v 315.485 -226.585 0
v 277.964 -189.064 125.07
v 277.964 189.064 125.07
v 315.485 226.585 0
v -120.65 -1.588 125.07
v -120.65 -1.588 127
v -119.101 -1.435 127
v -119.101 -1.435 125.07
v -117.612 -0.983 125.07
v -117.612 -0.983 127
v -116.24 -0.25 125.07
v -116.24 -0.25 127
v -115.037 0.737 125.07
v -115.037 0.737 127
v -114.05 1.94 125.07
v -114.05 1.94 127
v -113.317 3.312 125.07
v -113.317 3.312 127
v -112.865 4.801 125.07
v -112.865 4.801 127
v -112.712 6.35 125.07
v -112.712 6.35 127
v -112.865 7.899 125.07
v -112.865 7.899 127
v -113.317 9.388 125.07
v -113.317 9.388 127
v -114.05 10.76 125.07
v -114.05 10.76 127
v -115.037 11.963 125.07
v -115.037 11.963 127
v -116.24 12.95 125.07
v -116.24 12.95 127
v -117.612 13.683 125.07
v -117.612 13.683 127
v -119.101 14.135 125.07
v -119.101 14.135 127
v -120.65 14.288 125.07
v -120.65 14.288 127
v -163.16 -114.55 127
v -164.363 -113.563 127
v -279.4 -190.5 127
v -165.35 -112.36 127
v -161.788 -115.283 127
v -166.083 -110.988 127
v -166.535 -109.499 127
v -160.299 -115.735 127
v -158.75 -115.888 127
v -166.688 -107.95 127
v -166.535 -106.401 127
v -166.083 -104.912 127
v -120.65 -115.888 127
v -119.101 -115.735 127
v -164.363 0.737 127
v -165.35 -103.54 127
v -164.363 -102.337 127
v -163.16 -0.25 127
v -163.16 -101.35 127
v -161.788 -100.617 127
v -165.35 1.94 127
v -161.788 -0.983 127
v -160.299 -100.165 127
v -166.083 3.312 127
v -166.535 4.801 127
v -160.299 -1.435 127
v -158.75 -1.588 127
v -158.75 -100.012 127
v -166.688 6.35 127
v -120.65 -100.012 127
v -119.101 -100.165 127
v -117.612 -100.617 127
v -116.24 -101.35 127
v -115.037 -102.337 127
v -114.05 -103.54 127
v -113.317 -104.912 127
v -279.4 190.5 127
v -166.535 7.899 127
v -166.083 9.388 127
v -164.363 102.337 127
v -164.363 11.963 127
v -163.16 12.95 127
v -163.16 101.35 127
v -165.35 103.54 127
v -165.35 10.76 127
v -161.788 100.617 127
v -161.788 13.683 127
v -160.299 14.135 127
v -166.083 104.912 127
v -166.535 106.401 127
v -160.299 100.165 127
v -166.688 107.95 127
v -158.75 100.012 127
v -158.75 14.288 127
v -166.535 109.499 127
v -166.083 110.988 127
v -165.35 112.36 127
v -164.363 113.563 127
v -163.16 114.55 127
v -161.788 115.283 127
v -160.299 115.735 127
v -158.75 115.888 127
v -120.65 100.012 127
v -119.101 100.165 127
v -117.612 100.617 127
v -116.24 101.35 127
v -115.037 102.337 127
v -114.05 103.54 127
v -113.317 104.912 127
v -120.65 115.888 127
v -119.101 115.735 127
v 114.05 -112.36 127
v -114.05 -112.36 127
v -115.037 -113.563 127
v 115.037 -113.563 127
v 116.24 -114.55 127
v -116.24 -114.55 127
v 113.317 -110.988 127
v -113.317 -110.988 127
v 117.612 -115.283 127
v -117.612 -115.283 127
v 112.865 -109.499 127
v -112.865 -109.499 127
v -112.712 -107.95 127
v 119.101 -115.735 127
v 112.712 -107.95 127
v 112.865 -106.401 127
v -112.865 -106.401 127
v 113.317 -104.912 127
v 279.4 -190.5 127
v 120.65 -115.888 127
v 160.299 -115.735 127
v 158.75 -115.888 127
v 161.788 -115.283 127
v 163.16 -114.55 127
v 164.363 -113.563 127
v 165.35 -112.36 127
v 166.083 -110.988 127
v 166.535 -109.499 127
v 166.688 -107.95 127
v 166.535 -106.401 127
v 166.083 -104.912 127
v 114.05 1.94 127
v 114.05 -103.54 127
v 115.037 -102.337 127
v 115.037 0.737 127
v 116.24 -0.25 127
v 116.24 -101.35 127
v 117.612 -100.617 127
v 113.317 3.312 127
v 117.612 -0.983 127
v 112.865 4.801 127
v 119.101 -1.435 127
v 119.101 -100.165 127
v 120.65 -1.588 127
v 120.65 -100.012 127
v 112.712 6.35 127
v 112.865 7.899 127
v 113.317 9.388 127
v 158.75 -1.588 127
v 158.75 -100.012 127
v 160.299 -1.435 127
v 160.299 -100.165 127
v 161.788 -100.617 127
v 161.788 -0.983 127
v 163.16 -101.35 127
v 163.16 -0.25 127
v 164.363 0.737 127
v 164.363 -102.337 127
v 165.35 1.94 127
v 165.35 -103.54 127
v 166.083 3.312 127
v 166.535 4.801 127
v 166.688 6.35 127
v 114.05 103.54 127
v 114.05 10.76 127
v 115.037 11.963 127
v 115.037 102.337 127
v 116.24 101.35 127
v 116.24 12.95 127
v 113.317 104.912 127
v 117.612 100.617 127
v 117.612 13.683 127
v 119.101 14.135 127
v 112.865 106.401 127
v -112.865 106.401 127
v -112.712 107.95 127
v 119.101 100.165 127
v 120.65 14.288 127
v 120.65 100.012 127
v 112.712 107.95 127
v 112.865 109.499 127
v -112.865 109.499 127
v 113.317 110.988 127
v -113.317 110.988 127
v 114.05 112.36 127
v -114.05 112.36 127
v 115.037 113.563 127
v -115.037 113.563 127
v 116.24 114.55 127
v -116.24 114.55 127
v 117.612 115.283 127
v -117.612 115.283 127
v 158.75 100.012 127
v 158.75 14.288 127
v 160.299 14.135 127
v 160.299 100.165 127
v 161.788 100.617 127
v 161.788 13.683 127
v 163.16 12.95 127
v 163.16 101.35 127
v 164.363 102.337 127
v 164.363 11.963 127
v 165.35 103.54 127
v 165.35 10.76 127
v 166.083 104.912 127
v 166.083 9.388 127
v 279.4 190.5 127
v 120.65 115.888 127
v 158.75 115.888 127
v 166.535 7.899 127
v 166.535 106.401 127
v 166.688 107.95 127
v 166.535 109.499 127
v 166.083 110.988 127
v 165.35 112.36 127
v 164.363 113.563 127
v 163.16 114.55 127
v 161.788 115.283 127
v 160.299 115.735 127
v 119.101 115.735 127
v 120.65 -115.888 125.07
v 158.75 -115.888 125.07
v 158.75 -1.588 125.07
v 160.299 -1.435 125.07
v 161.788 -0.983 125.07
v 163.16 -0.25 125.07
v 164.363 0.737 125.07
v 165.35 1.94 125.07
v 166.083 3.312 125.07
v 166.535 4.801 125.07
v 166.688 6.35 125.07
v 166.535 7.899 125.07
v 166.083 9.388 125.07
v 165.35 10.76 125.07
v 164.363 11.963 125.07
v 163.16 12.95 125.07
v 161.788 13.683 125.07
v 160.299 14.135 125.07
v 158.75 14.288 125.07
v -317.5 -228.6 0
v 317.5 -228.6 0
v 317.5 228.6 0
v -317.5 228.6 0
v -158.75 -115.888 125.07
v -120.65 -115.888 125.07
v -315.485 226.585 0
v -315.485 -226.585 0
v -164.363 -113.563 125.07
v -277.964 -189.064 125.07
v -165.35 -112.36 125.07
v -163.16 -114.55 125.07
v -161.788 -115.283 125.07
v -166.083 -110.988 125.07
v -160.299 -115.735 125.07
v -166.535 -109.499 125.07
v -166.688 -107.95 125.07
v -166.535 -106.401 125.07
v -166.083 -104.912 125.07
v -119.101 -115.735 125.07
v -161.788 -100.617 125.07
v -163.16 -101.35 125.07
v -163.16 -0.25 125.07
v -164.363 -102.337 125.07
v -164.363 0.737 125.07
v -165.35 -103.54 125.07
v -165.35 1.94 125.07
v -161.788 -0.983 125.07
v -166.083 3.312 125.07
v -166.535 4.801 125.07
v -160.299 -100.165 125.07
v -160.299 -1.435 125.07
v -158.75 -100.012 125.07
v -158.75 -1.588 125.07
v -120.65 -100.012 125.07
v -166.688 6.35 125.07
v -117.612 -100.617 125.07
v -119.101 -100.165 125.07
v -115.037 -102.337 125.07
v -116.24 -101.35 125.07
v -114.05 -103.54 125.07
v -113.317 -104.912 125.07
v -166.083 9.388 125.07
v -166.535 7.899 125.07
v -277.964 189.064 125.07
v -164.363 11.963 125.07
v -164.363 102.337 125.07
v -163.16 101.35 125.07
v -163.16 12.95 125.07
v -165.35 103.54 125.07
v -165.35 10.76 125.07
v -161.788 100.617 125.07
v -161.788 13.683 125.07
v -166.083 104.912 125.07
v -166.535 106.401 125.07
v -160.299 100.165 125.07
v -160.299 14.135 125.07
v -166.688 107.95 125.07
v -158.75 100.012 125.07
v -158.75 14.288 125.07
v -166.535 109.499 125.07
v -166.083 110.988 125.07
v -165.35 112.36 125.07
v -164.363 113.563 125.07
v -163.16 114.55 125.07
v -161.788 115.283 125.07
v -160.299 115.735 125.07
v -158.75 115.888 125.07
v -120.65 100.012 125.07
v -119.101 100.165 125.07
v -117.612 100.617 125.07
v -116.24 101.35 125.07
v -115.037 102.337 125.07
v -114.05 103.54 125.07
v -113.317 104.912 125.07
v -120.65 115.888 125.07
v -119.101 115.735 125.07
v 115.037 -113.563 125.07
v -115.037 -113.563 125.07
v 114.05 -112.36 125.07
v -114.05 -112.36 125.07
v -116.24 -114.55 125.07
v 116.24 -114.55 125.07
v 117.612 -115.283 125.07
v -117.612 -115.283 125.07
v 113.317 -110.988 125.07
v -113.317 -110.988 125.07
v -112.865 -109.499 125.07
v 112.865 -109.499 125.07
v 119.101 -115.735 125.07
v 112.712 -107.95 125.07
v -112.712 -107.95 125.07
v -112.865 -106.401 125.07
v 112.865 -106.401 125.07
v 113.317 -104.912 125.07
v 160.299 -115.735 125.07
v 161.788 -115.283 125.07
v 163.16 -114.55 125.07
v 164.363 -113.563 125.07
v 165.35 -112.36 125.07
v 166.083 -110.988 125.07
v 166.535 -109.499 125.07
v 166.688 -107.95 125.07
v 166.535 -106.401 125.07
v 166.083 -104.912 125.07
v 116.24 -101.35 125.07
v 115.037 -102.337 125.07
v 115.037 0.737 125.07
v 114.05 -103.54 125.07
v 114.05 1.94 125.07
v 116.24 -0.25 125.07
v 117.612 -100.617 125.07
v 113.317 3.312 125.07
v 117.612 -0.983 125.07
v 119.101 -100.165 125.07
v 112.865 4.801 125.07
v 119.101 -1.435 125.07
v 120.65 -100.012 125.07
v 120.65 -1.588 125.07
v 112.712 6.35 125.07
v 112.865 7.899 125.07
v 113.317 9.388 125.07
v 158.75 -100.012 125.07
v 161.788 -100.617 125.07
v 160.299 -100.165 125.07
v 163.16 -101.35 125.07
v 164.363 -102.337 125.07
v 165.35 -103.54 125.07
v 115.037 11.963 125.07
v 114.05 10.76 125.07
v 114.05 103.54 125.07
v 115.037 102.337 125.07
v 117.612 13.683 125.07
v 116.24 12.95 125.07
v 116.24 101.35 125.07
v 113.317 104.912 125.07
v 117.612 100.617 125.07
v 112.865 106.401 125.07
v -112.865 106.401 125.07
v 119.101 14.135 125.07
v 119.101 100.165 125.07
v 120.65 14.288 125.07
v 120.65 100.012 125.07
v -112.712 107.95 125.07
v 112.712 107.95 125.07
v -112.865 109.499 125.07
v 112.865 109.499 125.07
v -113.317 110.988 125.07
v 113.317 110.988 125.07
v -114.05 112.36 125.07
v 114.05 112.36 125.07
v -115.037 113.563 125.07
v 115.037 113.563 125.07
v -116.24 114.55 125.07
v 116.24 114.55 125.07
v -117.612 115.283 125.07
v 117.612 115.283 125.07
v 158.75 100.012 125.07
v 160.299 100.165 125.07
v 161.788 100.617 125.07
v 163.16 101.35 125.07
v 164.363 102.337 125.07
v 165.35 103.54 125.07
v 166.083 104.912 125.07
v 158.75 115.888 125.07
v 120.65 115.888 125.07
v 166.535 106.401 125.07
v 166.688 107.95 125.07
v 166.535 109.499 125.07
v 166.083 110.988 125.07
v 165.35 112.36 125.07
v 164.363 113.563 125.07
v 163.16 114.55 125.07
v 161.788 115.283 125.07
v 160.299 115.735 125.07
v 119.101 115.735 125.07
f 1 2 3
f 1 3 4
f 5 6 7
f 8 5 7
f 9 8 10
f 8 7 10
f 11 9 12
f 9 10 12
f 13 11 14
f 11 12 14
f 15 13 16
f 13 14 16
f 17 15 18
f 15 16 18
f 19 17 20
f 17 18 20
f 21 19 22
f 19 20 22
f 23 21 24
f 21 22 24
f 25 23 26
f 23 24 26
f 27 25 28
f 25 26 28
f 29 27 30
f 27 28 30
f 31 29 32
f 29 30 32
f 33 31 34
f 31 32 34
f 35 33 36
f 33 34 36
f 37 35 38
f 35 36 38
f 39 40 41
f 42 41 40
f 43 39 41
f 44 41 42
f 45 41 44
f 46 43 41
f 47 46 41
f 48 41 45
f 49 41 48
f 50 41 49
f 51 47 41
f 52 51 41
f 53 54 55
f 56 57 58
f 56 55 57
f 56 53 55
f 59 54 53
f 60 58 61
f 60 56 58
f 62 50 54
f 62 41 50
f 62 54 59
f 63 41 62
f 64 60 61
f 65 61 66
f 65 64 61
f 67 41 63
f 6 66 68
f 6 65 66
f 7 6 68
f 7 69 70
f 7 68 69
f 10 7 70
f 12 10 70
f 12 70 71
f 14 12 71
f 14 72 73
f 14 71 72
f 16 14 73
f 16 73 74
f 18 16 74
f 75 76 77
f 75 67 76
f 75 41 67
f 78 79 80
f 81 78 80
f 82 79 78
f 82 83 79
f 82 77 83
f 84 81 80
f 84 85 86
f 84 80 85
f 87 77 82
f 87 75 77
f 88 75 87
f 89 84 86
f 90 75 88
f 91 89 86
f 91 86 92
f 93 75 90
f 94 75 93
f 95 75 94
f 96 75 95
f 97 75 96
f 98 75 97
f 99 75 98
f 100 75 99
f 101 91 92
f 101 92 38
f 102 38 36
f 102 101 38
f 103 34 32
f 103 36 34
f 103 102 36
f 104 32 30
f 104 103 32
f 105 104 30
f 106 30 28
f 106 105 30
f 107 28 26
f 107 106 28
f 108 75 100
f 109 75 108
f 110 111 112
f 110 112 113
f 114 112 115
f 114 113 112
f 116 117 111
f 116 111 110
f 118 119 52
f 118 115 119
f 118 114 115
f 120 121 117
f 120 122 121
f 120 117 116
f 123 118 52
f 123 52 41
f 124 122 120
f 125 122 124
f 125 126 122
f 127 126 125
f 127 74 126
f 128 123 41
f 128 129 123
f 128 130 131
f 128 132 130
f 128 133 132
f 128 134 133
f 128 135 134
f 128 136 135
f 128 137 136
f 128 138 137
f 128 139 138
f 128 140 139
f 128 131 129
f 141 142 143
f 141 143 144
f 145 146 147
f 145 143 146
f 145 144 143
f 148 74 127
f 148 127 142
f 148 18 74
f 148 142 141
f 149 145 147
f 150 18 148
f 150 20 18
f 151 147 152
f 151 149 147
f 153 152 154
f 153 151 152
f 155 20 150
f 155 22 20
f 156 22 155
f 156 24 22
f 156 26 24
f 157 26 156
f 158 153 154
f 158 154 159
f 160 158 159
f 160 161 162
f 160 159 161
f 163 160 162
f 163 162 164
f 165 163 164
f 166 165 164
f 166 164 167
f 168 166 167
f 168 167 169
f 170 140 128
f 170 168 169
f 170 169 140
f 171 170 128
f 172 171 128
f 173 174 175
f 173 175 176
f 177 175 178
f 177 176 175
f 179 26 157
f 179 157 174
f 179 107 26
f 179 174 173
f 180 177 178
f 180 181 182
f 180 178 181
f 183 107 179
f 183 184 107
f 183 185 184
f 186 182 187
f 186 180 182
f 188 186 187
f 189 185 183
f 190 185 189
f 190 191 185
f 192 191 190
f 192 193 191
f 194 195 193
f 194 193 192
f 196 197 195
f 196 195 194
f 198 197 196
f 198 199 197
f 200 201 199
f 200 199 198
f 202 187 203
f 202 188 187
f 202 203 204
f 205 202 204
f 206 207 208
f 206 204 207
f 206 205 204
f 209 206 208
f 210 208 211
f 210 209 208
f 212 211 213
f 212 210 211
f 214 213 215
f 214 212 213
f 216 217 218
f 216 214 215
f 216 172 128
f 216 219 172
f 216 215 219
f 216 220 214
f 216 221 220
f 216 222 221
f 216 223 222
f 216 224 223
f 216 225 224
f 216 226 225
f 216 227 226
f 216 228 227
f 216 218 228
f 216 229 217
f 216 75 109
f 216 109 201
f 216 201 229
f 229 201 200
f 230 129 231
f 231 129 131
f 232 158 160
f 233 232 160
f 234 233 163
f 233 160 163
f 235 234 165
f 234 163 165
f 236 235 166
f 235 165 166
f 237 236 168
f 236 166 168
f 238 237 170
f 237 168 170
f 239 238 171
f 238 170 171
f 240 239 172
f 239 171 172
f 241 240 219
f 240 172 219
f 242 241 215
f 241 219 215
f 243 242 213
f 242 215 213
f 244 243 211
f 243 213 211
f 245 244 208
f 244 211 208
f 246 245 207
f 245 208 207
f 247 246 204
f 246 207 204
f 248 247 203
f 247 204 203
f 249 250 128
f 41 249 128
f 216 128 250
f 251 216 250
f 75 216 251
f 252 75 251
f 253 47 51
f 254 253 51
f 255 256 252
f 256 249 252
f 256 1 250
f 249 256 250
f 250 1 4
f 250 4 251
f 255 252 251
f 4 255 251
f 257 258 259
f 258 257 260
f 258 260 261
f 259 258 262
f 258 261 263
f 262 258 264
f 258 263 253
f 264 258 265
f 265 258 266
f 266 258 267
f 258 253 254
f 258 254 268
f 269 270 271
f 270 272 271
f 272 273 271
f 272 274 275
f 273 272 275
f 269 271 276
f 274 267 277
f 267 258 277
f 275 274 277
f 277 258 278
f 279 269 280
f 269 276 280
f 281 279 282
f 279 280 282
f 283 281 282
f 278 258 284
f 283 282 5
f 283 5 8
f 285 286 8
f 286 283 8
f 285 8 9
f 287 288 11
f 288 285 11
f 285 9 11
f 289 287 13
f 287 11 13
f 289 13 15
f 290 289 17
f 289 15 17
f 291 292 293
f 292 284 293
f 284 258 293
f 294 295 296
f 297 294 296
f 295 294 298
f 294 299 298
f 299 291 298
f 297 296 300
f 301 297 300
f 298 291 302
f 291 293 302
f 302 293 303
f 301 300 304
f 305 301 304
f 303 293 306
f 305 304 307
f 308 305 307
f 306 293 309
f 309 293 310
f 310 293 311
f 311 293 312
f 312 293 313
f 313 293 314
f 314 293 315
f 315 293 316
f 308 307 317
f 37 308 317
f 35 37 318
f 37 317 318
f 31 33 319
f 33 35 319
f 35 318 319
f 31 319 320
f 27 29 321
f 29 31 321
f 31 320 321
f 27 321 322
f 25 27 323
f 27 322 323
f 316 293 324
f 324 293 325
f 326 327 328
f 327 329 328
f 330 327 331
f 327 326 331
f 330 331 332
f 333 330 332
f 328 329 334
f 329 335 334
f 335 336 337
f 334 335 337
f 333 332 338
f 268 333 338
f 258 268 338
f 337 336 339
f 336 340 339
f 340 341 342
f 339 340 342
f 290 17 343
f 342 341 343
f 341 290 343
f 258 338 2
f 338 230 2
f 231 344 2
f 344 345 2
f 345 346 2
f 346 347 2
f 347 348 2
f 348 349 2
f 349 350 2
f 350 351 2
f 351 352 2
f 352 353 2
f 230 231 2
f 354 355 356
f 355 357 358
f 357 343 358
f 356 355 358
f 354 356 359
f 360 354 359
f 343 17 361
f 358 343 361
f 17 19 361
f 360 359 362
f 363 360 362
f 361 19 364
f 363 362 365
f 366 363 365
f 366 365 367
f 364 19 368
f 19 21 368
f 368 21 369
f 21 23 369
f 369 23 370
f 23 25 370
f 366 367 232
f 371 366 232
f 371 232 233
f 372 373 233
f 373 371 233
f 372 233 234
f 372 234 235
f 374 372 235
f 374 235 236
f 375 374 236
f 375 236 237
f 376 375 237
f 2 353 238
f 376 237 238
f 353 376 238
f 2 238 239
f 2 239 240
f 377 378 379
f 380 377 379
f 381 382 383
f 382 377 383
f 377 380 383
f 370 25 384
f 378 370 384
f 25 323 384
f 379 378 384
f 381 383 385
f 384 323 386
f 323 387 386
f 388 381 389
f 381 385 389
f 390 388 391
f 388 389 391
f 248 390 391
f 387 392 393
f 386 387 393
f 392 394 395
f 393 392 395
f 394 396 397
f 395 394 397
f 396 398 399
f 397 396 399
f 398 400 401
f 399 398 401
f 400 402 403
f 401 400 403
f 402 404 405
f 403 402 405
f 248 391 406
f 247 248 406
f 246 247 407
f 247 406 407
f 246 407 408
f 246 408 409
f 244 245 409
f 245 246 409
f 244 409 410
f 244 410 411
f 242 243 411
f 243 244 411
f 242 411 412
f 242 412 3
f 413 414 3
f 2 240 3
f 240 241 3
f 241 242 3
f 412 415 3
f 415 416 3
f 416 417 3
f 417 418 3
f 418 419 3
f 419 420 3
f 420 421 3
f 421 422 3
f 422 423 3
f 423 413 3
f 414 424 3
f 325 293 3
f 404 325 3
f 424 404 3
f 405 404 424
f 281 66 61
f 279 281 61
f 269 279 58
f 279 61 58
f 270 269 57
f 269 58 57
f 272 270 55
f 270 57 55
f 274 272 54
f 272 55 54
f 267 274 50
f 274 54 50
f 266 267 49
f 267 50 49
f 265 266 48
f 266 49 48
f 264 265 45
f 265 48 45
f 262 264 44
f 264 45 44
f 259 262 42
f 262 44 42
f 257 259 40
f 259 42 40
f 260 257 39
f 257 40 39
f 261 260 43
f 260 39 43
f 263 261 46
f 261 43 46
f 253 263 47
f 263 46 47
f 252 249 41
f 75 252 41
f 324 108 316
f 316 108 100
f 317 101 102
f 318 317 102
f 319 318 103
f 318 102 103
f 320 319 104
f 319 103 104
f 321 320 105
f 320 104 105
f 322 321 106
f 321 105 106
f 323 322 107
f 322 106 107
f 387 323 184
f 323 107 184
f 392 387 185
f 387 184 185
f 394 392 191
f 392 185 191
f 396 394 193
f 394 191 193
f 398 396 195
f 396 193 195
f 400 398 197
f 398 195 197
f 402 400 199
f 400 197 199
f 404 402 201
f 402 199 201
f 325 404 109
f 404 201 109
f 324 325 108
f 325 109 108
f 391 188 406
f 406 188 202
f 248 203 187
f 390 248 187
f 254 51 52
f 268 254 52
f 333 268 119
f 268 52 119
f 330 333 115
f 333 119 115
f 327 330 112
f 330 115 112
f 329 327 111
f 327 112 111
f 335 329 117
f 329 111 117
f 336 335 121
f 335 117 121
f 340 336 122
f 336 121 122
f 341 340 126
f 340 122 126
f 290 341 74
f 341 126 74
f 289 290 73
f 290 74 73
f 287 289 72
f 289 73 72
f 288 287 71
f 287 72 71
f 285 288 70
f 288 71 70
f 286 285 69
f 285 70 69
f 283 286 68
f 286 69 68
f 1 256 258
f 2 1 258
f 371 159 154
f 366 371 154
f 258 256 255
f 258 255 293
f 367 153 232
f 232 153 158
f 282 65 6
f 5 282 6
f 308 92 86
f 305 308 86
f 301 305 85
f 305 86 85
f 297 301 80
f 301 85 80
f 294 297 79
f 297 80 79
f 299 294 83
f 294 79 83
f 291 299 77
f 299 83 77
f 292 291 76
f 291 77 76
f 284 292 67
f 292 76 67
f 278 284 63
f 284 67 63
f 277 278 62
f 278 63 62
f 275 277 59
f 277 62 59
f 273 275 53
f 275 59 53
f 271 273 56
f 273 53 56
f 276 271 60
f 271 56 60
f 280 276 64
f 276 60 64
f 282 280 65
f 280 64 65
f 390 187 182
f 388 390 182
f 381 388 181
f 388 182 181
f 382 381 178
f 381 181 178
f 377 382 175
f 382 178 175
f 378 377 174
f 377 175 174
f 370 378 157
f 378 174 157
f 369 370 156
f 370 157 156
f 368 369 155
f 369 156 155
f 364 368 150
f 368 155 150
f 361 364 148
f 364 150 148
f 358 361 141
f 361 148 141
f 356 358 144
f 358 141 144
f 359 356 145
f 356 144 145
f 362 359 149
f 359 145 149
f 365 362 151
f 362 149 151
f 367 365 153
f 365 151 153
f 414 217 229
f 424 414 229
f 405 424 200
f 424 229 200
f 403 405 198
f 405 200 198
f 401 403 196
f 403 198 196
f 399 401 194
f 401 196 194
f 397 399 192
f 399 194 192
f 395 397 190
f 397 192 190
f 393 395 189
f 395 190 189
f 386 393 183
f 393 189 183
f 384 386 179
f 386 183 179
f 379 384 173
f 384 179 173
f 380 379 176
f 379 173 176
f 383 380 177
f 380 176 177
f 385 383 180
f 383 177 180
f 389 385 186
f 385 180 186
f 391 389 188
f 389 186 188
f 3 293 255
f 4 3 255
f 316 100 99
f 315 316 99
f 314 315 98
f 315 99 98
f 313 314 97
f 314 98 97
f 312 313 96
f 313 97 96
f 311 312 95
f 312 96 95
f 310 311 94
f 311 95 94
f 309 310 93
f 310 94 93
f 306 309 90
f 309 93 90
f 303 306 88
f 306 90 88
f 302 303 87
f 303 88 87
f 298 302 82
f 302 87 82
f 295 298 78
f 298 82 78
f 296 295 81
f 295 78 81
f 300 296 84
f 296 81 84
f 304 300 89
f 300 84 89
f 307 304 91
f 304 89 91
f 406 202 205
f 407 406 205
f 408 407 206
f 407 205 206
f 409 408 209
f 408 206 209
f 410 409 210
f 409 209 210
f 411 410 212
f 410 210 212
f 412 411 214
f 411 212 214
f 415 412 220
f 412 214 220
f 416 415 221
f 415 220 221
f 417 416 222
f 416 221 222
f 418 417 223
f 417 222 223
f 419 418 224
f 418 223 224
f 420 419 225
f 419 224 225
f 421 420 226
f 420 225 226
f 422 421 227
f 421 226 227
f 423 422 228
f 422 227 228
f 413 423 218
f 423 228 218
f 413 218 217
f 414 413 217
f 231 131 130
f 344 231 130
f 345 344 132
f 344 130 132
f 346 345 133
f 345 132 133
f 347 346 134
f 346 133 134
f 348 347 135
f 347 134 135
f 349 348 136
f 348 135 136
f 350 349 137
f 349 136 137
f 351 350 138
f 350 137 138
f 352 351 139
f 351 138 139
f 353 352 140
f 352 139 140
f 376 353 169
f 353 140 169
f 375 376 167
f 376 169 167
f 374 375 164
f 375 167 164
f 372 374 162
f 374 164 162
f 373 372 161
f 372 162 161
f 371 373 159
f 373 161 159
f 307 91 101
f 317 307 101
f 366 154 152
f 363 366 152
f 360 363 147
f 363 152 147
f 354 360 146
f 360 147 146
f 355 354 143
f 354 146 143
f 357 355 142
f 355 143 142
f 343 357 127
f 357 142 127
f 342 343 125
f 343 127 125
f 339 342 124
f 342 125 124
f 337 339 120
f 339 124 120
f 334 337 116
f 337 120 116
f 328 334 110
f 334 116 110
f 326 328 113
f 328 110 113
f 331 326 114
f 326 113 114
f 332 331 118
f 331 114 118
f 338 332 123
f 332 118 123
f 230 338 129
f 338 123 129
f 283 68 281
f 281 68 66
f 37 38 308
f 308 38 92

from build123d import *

# Parameters (mm, degrees)
F0_W     = 635
F0_H     = 457.2
F1_DEPTH = 127
F3_DEPTH = 457.201
F5_DEPTH = 330.2
F6_T     = -1.9304
F8_DEPTH = 127.001


with BuildPart() as f1:
    # F0 (on Top) → F1 (new body)
    with BuildSketch(Plane.XY):
        Rectangle(F0_W, F0_H)
    extrude(amount=F1_DEPTH)

    # F2 (on face) → F3 (cut, through all)
    with BuildSketch(Plane.XZ.offset(228.6)):
        Polygon((-317.5, 127), (-317.5, 0), (-279.4, 127), align=None)
        Polygon((279.4, 127), (317.5, 0), (317.5, 127), align=None)
    extrude(amount=-F3_DEPTH, mode=Mode.SUBTRACT)

    # F4 (on Right) → F5 (cut, symmetric)
    with BuildSketch(Plane.YZ):
        Polygon((-228.6, 127), (-228.6, 0), (-190.5, 127), align=None)
        Polygon((228.6, 0), (228.6, 127), (190.5, 127), align=None)
    extrude(amount=F5_DEPTH, both=True, mode=Mode.SUBTRACT)

    # F6
    f6_openings = [f1.faces().sort_by_distance(p)[0] for p in [
        (0, 0, 0),
    ]]
    offset(amount=F6_T, openings=f6_openings)

    # F7 (on face) → F8 (cut, through all)
    with BuildSketch(Plane.XY.offset(127)):
        with BuildLine():
            ThreePointArc((-158.75, 115.8875), (-166.6875, 107.95), (-158.75, 100.0125))
            Line((-158.75, 100.0125), (-120.65, 100.0125))
            ThreePointArc((-120.65, 100.0125), (-112.7125, 107.95), (-120.65, 115.8875))
            Line((-120.65, 115.8875), (-158.75, 115.8875))
        make_face()
        with BuildLine():
            ThreePointArc((158.75, 100.0125), (166.6875, 107.95), (158.75, 115.8875))
            Line((158.75, 115.8875), (120.65, 115.8875))
            ThreePointArc((120.65, 115.8875), (112.7125, 107.95), (120.65, 100.0125))
            Line((120.65, 100.0125), (158.75, 100.0125))
        make_face()
        with BuildLine():
            Line((120.65, -1.5875), (158.75, -1.5875))
            ThreePointArc((158.75, -1.5875), (166.6875, 6.35), (158.75, 14.2875))
            Line((158.75, 14.2875), (120.65, 14.2875))
            ThreePointArc((120.65, 14.2875), (112.7125, 6.35), (120.65, -1.5875))
        make_face()
        with BuildLine():
            Line((-158.75, -1.5875), (-120.65, -1.5875))
            ThreePointArc((-120.65, -1.5875), (-112.7125, 6.35), (-120.65, 14.2875))
            Line((-120.65, 14.2875), (-158.75, 14.2875))
            ThreePointArc((-158.75, 14.2875), (-166.6875, 6.35), (-158.75, -1.5875))
        make_face()
        with BuildLine():
            ThreePointArc((-158.75, -100.0125), (-166.6875, -107.95), (-158.75, -115.8875))
            Line((-158.75, -115.8875), (-120.65, -115.8875))
            ThreePointArc((-120.65, -115.8875), (-112.7125, -107.95), (-120.65, -100.0125))
            Line((-120.65, -100.0125), (-158.75, -100.0125))
        make_face()
        with BuildLine():
            ThreePointArc((120.65, -100.0125), (112.7125, -107.95), (120.65, -115.8875))
            Line((120.65, -115.8875), (158.75, -115.8875))
            ThreePointArc((158.75, -115.8875), (166.6875, -107.95), (158.75, -100.0125))
            Line((158.75, -100.0125), (120.65, -100.0125))
        make_face()
    extrude(amount=-F8_DEPTH, mode=Mode.SUBTRACT)


solid = f1.part
